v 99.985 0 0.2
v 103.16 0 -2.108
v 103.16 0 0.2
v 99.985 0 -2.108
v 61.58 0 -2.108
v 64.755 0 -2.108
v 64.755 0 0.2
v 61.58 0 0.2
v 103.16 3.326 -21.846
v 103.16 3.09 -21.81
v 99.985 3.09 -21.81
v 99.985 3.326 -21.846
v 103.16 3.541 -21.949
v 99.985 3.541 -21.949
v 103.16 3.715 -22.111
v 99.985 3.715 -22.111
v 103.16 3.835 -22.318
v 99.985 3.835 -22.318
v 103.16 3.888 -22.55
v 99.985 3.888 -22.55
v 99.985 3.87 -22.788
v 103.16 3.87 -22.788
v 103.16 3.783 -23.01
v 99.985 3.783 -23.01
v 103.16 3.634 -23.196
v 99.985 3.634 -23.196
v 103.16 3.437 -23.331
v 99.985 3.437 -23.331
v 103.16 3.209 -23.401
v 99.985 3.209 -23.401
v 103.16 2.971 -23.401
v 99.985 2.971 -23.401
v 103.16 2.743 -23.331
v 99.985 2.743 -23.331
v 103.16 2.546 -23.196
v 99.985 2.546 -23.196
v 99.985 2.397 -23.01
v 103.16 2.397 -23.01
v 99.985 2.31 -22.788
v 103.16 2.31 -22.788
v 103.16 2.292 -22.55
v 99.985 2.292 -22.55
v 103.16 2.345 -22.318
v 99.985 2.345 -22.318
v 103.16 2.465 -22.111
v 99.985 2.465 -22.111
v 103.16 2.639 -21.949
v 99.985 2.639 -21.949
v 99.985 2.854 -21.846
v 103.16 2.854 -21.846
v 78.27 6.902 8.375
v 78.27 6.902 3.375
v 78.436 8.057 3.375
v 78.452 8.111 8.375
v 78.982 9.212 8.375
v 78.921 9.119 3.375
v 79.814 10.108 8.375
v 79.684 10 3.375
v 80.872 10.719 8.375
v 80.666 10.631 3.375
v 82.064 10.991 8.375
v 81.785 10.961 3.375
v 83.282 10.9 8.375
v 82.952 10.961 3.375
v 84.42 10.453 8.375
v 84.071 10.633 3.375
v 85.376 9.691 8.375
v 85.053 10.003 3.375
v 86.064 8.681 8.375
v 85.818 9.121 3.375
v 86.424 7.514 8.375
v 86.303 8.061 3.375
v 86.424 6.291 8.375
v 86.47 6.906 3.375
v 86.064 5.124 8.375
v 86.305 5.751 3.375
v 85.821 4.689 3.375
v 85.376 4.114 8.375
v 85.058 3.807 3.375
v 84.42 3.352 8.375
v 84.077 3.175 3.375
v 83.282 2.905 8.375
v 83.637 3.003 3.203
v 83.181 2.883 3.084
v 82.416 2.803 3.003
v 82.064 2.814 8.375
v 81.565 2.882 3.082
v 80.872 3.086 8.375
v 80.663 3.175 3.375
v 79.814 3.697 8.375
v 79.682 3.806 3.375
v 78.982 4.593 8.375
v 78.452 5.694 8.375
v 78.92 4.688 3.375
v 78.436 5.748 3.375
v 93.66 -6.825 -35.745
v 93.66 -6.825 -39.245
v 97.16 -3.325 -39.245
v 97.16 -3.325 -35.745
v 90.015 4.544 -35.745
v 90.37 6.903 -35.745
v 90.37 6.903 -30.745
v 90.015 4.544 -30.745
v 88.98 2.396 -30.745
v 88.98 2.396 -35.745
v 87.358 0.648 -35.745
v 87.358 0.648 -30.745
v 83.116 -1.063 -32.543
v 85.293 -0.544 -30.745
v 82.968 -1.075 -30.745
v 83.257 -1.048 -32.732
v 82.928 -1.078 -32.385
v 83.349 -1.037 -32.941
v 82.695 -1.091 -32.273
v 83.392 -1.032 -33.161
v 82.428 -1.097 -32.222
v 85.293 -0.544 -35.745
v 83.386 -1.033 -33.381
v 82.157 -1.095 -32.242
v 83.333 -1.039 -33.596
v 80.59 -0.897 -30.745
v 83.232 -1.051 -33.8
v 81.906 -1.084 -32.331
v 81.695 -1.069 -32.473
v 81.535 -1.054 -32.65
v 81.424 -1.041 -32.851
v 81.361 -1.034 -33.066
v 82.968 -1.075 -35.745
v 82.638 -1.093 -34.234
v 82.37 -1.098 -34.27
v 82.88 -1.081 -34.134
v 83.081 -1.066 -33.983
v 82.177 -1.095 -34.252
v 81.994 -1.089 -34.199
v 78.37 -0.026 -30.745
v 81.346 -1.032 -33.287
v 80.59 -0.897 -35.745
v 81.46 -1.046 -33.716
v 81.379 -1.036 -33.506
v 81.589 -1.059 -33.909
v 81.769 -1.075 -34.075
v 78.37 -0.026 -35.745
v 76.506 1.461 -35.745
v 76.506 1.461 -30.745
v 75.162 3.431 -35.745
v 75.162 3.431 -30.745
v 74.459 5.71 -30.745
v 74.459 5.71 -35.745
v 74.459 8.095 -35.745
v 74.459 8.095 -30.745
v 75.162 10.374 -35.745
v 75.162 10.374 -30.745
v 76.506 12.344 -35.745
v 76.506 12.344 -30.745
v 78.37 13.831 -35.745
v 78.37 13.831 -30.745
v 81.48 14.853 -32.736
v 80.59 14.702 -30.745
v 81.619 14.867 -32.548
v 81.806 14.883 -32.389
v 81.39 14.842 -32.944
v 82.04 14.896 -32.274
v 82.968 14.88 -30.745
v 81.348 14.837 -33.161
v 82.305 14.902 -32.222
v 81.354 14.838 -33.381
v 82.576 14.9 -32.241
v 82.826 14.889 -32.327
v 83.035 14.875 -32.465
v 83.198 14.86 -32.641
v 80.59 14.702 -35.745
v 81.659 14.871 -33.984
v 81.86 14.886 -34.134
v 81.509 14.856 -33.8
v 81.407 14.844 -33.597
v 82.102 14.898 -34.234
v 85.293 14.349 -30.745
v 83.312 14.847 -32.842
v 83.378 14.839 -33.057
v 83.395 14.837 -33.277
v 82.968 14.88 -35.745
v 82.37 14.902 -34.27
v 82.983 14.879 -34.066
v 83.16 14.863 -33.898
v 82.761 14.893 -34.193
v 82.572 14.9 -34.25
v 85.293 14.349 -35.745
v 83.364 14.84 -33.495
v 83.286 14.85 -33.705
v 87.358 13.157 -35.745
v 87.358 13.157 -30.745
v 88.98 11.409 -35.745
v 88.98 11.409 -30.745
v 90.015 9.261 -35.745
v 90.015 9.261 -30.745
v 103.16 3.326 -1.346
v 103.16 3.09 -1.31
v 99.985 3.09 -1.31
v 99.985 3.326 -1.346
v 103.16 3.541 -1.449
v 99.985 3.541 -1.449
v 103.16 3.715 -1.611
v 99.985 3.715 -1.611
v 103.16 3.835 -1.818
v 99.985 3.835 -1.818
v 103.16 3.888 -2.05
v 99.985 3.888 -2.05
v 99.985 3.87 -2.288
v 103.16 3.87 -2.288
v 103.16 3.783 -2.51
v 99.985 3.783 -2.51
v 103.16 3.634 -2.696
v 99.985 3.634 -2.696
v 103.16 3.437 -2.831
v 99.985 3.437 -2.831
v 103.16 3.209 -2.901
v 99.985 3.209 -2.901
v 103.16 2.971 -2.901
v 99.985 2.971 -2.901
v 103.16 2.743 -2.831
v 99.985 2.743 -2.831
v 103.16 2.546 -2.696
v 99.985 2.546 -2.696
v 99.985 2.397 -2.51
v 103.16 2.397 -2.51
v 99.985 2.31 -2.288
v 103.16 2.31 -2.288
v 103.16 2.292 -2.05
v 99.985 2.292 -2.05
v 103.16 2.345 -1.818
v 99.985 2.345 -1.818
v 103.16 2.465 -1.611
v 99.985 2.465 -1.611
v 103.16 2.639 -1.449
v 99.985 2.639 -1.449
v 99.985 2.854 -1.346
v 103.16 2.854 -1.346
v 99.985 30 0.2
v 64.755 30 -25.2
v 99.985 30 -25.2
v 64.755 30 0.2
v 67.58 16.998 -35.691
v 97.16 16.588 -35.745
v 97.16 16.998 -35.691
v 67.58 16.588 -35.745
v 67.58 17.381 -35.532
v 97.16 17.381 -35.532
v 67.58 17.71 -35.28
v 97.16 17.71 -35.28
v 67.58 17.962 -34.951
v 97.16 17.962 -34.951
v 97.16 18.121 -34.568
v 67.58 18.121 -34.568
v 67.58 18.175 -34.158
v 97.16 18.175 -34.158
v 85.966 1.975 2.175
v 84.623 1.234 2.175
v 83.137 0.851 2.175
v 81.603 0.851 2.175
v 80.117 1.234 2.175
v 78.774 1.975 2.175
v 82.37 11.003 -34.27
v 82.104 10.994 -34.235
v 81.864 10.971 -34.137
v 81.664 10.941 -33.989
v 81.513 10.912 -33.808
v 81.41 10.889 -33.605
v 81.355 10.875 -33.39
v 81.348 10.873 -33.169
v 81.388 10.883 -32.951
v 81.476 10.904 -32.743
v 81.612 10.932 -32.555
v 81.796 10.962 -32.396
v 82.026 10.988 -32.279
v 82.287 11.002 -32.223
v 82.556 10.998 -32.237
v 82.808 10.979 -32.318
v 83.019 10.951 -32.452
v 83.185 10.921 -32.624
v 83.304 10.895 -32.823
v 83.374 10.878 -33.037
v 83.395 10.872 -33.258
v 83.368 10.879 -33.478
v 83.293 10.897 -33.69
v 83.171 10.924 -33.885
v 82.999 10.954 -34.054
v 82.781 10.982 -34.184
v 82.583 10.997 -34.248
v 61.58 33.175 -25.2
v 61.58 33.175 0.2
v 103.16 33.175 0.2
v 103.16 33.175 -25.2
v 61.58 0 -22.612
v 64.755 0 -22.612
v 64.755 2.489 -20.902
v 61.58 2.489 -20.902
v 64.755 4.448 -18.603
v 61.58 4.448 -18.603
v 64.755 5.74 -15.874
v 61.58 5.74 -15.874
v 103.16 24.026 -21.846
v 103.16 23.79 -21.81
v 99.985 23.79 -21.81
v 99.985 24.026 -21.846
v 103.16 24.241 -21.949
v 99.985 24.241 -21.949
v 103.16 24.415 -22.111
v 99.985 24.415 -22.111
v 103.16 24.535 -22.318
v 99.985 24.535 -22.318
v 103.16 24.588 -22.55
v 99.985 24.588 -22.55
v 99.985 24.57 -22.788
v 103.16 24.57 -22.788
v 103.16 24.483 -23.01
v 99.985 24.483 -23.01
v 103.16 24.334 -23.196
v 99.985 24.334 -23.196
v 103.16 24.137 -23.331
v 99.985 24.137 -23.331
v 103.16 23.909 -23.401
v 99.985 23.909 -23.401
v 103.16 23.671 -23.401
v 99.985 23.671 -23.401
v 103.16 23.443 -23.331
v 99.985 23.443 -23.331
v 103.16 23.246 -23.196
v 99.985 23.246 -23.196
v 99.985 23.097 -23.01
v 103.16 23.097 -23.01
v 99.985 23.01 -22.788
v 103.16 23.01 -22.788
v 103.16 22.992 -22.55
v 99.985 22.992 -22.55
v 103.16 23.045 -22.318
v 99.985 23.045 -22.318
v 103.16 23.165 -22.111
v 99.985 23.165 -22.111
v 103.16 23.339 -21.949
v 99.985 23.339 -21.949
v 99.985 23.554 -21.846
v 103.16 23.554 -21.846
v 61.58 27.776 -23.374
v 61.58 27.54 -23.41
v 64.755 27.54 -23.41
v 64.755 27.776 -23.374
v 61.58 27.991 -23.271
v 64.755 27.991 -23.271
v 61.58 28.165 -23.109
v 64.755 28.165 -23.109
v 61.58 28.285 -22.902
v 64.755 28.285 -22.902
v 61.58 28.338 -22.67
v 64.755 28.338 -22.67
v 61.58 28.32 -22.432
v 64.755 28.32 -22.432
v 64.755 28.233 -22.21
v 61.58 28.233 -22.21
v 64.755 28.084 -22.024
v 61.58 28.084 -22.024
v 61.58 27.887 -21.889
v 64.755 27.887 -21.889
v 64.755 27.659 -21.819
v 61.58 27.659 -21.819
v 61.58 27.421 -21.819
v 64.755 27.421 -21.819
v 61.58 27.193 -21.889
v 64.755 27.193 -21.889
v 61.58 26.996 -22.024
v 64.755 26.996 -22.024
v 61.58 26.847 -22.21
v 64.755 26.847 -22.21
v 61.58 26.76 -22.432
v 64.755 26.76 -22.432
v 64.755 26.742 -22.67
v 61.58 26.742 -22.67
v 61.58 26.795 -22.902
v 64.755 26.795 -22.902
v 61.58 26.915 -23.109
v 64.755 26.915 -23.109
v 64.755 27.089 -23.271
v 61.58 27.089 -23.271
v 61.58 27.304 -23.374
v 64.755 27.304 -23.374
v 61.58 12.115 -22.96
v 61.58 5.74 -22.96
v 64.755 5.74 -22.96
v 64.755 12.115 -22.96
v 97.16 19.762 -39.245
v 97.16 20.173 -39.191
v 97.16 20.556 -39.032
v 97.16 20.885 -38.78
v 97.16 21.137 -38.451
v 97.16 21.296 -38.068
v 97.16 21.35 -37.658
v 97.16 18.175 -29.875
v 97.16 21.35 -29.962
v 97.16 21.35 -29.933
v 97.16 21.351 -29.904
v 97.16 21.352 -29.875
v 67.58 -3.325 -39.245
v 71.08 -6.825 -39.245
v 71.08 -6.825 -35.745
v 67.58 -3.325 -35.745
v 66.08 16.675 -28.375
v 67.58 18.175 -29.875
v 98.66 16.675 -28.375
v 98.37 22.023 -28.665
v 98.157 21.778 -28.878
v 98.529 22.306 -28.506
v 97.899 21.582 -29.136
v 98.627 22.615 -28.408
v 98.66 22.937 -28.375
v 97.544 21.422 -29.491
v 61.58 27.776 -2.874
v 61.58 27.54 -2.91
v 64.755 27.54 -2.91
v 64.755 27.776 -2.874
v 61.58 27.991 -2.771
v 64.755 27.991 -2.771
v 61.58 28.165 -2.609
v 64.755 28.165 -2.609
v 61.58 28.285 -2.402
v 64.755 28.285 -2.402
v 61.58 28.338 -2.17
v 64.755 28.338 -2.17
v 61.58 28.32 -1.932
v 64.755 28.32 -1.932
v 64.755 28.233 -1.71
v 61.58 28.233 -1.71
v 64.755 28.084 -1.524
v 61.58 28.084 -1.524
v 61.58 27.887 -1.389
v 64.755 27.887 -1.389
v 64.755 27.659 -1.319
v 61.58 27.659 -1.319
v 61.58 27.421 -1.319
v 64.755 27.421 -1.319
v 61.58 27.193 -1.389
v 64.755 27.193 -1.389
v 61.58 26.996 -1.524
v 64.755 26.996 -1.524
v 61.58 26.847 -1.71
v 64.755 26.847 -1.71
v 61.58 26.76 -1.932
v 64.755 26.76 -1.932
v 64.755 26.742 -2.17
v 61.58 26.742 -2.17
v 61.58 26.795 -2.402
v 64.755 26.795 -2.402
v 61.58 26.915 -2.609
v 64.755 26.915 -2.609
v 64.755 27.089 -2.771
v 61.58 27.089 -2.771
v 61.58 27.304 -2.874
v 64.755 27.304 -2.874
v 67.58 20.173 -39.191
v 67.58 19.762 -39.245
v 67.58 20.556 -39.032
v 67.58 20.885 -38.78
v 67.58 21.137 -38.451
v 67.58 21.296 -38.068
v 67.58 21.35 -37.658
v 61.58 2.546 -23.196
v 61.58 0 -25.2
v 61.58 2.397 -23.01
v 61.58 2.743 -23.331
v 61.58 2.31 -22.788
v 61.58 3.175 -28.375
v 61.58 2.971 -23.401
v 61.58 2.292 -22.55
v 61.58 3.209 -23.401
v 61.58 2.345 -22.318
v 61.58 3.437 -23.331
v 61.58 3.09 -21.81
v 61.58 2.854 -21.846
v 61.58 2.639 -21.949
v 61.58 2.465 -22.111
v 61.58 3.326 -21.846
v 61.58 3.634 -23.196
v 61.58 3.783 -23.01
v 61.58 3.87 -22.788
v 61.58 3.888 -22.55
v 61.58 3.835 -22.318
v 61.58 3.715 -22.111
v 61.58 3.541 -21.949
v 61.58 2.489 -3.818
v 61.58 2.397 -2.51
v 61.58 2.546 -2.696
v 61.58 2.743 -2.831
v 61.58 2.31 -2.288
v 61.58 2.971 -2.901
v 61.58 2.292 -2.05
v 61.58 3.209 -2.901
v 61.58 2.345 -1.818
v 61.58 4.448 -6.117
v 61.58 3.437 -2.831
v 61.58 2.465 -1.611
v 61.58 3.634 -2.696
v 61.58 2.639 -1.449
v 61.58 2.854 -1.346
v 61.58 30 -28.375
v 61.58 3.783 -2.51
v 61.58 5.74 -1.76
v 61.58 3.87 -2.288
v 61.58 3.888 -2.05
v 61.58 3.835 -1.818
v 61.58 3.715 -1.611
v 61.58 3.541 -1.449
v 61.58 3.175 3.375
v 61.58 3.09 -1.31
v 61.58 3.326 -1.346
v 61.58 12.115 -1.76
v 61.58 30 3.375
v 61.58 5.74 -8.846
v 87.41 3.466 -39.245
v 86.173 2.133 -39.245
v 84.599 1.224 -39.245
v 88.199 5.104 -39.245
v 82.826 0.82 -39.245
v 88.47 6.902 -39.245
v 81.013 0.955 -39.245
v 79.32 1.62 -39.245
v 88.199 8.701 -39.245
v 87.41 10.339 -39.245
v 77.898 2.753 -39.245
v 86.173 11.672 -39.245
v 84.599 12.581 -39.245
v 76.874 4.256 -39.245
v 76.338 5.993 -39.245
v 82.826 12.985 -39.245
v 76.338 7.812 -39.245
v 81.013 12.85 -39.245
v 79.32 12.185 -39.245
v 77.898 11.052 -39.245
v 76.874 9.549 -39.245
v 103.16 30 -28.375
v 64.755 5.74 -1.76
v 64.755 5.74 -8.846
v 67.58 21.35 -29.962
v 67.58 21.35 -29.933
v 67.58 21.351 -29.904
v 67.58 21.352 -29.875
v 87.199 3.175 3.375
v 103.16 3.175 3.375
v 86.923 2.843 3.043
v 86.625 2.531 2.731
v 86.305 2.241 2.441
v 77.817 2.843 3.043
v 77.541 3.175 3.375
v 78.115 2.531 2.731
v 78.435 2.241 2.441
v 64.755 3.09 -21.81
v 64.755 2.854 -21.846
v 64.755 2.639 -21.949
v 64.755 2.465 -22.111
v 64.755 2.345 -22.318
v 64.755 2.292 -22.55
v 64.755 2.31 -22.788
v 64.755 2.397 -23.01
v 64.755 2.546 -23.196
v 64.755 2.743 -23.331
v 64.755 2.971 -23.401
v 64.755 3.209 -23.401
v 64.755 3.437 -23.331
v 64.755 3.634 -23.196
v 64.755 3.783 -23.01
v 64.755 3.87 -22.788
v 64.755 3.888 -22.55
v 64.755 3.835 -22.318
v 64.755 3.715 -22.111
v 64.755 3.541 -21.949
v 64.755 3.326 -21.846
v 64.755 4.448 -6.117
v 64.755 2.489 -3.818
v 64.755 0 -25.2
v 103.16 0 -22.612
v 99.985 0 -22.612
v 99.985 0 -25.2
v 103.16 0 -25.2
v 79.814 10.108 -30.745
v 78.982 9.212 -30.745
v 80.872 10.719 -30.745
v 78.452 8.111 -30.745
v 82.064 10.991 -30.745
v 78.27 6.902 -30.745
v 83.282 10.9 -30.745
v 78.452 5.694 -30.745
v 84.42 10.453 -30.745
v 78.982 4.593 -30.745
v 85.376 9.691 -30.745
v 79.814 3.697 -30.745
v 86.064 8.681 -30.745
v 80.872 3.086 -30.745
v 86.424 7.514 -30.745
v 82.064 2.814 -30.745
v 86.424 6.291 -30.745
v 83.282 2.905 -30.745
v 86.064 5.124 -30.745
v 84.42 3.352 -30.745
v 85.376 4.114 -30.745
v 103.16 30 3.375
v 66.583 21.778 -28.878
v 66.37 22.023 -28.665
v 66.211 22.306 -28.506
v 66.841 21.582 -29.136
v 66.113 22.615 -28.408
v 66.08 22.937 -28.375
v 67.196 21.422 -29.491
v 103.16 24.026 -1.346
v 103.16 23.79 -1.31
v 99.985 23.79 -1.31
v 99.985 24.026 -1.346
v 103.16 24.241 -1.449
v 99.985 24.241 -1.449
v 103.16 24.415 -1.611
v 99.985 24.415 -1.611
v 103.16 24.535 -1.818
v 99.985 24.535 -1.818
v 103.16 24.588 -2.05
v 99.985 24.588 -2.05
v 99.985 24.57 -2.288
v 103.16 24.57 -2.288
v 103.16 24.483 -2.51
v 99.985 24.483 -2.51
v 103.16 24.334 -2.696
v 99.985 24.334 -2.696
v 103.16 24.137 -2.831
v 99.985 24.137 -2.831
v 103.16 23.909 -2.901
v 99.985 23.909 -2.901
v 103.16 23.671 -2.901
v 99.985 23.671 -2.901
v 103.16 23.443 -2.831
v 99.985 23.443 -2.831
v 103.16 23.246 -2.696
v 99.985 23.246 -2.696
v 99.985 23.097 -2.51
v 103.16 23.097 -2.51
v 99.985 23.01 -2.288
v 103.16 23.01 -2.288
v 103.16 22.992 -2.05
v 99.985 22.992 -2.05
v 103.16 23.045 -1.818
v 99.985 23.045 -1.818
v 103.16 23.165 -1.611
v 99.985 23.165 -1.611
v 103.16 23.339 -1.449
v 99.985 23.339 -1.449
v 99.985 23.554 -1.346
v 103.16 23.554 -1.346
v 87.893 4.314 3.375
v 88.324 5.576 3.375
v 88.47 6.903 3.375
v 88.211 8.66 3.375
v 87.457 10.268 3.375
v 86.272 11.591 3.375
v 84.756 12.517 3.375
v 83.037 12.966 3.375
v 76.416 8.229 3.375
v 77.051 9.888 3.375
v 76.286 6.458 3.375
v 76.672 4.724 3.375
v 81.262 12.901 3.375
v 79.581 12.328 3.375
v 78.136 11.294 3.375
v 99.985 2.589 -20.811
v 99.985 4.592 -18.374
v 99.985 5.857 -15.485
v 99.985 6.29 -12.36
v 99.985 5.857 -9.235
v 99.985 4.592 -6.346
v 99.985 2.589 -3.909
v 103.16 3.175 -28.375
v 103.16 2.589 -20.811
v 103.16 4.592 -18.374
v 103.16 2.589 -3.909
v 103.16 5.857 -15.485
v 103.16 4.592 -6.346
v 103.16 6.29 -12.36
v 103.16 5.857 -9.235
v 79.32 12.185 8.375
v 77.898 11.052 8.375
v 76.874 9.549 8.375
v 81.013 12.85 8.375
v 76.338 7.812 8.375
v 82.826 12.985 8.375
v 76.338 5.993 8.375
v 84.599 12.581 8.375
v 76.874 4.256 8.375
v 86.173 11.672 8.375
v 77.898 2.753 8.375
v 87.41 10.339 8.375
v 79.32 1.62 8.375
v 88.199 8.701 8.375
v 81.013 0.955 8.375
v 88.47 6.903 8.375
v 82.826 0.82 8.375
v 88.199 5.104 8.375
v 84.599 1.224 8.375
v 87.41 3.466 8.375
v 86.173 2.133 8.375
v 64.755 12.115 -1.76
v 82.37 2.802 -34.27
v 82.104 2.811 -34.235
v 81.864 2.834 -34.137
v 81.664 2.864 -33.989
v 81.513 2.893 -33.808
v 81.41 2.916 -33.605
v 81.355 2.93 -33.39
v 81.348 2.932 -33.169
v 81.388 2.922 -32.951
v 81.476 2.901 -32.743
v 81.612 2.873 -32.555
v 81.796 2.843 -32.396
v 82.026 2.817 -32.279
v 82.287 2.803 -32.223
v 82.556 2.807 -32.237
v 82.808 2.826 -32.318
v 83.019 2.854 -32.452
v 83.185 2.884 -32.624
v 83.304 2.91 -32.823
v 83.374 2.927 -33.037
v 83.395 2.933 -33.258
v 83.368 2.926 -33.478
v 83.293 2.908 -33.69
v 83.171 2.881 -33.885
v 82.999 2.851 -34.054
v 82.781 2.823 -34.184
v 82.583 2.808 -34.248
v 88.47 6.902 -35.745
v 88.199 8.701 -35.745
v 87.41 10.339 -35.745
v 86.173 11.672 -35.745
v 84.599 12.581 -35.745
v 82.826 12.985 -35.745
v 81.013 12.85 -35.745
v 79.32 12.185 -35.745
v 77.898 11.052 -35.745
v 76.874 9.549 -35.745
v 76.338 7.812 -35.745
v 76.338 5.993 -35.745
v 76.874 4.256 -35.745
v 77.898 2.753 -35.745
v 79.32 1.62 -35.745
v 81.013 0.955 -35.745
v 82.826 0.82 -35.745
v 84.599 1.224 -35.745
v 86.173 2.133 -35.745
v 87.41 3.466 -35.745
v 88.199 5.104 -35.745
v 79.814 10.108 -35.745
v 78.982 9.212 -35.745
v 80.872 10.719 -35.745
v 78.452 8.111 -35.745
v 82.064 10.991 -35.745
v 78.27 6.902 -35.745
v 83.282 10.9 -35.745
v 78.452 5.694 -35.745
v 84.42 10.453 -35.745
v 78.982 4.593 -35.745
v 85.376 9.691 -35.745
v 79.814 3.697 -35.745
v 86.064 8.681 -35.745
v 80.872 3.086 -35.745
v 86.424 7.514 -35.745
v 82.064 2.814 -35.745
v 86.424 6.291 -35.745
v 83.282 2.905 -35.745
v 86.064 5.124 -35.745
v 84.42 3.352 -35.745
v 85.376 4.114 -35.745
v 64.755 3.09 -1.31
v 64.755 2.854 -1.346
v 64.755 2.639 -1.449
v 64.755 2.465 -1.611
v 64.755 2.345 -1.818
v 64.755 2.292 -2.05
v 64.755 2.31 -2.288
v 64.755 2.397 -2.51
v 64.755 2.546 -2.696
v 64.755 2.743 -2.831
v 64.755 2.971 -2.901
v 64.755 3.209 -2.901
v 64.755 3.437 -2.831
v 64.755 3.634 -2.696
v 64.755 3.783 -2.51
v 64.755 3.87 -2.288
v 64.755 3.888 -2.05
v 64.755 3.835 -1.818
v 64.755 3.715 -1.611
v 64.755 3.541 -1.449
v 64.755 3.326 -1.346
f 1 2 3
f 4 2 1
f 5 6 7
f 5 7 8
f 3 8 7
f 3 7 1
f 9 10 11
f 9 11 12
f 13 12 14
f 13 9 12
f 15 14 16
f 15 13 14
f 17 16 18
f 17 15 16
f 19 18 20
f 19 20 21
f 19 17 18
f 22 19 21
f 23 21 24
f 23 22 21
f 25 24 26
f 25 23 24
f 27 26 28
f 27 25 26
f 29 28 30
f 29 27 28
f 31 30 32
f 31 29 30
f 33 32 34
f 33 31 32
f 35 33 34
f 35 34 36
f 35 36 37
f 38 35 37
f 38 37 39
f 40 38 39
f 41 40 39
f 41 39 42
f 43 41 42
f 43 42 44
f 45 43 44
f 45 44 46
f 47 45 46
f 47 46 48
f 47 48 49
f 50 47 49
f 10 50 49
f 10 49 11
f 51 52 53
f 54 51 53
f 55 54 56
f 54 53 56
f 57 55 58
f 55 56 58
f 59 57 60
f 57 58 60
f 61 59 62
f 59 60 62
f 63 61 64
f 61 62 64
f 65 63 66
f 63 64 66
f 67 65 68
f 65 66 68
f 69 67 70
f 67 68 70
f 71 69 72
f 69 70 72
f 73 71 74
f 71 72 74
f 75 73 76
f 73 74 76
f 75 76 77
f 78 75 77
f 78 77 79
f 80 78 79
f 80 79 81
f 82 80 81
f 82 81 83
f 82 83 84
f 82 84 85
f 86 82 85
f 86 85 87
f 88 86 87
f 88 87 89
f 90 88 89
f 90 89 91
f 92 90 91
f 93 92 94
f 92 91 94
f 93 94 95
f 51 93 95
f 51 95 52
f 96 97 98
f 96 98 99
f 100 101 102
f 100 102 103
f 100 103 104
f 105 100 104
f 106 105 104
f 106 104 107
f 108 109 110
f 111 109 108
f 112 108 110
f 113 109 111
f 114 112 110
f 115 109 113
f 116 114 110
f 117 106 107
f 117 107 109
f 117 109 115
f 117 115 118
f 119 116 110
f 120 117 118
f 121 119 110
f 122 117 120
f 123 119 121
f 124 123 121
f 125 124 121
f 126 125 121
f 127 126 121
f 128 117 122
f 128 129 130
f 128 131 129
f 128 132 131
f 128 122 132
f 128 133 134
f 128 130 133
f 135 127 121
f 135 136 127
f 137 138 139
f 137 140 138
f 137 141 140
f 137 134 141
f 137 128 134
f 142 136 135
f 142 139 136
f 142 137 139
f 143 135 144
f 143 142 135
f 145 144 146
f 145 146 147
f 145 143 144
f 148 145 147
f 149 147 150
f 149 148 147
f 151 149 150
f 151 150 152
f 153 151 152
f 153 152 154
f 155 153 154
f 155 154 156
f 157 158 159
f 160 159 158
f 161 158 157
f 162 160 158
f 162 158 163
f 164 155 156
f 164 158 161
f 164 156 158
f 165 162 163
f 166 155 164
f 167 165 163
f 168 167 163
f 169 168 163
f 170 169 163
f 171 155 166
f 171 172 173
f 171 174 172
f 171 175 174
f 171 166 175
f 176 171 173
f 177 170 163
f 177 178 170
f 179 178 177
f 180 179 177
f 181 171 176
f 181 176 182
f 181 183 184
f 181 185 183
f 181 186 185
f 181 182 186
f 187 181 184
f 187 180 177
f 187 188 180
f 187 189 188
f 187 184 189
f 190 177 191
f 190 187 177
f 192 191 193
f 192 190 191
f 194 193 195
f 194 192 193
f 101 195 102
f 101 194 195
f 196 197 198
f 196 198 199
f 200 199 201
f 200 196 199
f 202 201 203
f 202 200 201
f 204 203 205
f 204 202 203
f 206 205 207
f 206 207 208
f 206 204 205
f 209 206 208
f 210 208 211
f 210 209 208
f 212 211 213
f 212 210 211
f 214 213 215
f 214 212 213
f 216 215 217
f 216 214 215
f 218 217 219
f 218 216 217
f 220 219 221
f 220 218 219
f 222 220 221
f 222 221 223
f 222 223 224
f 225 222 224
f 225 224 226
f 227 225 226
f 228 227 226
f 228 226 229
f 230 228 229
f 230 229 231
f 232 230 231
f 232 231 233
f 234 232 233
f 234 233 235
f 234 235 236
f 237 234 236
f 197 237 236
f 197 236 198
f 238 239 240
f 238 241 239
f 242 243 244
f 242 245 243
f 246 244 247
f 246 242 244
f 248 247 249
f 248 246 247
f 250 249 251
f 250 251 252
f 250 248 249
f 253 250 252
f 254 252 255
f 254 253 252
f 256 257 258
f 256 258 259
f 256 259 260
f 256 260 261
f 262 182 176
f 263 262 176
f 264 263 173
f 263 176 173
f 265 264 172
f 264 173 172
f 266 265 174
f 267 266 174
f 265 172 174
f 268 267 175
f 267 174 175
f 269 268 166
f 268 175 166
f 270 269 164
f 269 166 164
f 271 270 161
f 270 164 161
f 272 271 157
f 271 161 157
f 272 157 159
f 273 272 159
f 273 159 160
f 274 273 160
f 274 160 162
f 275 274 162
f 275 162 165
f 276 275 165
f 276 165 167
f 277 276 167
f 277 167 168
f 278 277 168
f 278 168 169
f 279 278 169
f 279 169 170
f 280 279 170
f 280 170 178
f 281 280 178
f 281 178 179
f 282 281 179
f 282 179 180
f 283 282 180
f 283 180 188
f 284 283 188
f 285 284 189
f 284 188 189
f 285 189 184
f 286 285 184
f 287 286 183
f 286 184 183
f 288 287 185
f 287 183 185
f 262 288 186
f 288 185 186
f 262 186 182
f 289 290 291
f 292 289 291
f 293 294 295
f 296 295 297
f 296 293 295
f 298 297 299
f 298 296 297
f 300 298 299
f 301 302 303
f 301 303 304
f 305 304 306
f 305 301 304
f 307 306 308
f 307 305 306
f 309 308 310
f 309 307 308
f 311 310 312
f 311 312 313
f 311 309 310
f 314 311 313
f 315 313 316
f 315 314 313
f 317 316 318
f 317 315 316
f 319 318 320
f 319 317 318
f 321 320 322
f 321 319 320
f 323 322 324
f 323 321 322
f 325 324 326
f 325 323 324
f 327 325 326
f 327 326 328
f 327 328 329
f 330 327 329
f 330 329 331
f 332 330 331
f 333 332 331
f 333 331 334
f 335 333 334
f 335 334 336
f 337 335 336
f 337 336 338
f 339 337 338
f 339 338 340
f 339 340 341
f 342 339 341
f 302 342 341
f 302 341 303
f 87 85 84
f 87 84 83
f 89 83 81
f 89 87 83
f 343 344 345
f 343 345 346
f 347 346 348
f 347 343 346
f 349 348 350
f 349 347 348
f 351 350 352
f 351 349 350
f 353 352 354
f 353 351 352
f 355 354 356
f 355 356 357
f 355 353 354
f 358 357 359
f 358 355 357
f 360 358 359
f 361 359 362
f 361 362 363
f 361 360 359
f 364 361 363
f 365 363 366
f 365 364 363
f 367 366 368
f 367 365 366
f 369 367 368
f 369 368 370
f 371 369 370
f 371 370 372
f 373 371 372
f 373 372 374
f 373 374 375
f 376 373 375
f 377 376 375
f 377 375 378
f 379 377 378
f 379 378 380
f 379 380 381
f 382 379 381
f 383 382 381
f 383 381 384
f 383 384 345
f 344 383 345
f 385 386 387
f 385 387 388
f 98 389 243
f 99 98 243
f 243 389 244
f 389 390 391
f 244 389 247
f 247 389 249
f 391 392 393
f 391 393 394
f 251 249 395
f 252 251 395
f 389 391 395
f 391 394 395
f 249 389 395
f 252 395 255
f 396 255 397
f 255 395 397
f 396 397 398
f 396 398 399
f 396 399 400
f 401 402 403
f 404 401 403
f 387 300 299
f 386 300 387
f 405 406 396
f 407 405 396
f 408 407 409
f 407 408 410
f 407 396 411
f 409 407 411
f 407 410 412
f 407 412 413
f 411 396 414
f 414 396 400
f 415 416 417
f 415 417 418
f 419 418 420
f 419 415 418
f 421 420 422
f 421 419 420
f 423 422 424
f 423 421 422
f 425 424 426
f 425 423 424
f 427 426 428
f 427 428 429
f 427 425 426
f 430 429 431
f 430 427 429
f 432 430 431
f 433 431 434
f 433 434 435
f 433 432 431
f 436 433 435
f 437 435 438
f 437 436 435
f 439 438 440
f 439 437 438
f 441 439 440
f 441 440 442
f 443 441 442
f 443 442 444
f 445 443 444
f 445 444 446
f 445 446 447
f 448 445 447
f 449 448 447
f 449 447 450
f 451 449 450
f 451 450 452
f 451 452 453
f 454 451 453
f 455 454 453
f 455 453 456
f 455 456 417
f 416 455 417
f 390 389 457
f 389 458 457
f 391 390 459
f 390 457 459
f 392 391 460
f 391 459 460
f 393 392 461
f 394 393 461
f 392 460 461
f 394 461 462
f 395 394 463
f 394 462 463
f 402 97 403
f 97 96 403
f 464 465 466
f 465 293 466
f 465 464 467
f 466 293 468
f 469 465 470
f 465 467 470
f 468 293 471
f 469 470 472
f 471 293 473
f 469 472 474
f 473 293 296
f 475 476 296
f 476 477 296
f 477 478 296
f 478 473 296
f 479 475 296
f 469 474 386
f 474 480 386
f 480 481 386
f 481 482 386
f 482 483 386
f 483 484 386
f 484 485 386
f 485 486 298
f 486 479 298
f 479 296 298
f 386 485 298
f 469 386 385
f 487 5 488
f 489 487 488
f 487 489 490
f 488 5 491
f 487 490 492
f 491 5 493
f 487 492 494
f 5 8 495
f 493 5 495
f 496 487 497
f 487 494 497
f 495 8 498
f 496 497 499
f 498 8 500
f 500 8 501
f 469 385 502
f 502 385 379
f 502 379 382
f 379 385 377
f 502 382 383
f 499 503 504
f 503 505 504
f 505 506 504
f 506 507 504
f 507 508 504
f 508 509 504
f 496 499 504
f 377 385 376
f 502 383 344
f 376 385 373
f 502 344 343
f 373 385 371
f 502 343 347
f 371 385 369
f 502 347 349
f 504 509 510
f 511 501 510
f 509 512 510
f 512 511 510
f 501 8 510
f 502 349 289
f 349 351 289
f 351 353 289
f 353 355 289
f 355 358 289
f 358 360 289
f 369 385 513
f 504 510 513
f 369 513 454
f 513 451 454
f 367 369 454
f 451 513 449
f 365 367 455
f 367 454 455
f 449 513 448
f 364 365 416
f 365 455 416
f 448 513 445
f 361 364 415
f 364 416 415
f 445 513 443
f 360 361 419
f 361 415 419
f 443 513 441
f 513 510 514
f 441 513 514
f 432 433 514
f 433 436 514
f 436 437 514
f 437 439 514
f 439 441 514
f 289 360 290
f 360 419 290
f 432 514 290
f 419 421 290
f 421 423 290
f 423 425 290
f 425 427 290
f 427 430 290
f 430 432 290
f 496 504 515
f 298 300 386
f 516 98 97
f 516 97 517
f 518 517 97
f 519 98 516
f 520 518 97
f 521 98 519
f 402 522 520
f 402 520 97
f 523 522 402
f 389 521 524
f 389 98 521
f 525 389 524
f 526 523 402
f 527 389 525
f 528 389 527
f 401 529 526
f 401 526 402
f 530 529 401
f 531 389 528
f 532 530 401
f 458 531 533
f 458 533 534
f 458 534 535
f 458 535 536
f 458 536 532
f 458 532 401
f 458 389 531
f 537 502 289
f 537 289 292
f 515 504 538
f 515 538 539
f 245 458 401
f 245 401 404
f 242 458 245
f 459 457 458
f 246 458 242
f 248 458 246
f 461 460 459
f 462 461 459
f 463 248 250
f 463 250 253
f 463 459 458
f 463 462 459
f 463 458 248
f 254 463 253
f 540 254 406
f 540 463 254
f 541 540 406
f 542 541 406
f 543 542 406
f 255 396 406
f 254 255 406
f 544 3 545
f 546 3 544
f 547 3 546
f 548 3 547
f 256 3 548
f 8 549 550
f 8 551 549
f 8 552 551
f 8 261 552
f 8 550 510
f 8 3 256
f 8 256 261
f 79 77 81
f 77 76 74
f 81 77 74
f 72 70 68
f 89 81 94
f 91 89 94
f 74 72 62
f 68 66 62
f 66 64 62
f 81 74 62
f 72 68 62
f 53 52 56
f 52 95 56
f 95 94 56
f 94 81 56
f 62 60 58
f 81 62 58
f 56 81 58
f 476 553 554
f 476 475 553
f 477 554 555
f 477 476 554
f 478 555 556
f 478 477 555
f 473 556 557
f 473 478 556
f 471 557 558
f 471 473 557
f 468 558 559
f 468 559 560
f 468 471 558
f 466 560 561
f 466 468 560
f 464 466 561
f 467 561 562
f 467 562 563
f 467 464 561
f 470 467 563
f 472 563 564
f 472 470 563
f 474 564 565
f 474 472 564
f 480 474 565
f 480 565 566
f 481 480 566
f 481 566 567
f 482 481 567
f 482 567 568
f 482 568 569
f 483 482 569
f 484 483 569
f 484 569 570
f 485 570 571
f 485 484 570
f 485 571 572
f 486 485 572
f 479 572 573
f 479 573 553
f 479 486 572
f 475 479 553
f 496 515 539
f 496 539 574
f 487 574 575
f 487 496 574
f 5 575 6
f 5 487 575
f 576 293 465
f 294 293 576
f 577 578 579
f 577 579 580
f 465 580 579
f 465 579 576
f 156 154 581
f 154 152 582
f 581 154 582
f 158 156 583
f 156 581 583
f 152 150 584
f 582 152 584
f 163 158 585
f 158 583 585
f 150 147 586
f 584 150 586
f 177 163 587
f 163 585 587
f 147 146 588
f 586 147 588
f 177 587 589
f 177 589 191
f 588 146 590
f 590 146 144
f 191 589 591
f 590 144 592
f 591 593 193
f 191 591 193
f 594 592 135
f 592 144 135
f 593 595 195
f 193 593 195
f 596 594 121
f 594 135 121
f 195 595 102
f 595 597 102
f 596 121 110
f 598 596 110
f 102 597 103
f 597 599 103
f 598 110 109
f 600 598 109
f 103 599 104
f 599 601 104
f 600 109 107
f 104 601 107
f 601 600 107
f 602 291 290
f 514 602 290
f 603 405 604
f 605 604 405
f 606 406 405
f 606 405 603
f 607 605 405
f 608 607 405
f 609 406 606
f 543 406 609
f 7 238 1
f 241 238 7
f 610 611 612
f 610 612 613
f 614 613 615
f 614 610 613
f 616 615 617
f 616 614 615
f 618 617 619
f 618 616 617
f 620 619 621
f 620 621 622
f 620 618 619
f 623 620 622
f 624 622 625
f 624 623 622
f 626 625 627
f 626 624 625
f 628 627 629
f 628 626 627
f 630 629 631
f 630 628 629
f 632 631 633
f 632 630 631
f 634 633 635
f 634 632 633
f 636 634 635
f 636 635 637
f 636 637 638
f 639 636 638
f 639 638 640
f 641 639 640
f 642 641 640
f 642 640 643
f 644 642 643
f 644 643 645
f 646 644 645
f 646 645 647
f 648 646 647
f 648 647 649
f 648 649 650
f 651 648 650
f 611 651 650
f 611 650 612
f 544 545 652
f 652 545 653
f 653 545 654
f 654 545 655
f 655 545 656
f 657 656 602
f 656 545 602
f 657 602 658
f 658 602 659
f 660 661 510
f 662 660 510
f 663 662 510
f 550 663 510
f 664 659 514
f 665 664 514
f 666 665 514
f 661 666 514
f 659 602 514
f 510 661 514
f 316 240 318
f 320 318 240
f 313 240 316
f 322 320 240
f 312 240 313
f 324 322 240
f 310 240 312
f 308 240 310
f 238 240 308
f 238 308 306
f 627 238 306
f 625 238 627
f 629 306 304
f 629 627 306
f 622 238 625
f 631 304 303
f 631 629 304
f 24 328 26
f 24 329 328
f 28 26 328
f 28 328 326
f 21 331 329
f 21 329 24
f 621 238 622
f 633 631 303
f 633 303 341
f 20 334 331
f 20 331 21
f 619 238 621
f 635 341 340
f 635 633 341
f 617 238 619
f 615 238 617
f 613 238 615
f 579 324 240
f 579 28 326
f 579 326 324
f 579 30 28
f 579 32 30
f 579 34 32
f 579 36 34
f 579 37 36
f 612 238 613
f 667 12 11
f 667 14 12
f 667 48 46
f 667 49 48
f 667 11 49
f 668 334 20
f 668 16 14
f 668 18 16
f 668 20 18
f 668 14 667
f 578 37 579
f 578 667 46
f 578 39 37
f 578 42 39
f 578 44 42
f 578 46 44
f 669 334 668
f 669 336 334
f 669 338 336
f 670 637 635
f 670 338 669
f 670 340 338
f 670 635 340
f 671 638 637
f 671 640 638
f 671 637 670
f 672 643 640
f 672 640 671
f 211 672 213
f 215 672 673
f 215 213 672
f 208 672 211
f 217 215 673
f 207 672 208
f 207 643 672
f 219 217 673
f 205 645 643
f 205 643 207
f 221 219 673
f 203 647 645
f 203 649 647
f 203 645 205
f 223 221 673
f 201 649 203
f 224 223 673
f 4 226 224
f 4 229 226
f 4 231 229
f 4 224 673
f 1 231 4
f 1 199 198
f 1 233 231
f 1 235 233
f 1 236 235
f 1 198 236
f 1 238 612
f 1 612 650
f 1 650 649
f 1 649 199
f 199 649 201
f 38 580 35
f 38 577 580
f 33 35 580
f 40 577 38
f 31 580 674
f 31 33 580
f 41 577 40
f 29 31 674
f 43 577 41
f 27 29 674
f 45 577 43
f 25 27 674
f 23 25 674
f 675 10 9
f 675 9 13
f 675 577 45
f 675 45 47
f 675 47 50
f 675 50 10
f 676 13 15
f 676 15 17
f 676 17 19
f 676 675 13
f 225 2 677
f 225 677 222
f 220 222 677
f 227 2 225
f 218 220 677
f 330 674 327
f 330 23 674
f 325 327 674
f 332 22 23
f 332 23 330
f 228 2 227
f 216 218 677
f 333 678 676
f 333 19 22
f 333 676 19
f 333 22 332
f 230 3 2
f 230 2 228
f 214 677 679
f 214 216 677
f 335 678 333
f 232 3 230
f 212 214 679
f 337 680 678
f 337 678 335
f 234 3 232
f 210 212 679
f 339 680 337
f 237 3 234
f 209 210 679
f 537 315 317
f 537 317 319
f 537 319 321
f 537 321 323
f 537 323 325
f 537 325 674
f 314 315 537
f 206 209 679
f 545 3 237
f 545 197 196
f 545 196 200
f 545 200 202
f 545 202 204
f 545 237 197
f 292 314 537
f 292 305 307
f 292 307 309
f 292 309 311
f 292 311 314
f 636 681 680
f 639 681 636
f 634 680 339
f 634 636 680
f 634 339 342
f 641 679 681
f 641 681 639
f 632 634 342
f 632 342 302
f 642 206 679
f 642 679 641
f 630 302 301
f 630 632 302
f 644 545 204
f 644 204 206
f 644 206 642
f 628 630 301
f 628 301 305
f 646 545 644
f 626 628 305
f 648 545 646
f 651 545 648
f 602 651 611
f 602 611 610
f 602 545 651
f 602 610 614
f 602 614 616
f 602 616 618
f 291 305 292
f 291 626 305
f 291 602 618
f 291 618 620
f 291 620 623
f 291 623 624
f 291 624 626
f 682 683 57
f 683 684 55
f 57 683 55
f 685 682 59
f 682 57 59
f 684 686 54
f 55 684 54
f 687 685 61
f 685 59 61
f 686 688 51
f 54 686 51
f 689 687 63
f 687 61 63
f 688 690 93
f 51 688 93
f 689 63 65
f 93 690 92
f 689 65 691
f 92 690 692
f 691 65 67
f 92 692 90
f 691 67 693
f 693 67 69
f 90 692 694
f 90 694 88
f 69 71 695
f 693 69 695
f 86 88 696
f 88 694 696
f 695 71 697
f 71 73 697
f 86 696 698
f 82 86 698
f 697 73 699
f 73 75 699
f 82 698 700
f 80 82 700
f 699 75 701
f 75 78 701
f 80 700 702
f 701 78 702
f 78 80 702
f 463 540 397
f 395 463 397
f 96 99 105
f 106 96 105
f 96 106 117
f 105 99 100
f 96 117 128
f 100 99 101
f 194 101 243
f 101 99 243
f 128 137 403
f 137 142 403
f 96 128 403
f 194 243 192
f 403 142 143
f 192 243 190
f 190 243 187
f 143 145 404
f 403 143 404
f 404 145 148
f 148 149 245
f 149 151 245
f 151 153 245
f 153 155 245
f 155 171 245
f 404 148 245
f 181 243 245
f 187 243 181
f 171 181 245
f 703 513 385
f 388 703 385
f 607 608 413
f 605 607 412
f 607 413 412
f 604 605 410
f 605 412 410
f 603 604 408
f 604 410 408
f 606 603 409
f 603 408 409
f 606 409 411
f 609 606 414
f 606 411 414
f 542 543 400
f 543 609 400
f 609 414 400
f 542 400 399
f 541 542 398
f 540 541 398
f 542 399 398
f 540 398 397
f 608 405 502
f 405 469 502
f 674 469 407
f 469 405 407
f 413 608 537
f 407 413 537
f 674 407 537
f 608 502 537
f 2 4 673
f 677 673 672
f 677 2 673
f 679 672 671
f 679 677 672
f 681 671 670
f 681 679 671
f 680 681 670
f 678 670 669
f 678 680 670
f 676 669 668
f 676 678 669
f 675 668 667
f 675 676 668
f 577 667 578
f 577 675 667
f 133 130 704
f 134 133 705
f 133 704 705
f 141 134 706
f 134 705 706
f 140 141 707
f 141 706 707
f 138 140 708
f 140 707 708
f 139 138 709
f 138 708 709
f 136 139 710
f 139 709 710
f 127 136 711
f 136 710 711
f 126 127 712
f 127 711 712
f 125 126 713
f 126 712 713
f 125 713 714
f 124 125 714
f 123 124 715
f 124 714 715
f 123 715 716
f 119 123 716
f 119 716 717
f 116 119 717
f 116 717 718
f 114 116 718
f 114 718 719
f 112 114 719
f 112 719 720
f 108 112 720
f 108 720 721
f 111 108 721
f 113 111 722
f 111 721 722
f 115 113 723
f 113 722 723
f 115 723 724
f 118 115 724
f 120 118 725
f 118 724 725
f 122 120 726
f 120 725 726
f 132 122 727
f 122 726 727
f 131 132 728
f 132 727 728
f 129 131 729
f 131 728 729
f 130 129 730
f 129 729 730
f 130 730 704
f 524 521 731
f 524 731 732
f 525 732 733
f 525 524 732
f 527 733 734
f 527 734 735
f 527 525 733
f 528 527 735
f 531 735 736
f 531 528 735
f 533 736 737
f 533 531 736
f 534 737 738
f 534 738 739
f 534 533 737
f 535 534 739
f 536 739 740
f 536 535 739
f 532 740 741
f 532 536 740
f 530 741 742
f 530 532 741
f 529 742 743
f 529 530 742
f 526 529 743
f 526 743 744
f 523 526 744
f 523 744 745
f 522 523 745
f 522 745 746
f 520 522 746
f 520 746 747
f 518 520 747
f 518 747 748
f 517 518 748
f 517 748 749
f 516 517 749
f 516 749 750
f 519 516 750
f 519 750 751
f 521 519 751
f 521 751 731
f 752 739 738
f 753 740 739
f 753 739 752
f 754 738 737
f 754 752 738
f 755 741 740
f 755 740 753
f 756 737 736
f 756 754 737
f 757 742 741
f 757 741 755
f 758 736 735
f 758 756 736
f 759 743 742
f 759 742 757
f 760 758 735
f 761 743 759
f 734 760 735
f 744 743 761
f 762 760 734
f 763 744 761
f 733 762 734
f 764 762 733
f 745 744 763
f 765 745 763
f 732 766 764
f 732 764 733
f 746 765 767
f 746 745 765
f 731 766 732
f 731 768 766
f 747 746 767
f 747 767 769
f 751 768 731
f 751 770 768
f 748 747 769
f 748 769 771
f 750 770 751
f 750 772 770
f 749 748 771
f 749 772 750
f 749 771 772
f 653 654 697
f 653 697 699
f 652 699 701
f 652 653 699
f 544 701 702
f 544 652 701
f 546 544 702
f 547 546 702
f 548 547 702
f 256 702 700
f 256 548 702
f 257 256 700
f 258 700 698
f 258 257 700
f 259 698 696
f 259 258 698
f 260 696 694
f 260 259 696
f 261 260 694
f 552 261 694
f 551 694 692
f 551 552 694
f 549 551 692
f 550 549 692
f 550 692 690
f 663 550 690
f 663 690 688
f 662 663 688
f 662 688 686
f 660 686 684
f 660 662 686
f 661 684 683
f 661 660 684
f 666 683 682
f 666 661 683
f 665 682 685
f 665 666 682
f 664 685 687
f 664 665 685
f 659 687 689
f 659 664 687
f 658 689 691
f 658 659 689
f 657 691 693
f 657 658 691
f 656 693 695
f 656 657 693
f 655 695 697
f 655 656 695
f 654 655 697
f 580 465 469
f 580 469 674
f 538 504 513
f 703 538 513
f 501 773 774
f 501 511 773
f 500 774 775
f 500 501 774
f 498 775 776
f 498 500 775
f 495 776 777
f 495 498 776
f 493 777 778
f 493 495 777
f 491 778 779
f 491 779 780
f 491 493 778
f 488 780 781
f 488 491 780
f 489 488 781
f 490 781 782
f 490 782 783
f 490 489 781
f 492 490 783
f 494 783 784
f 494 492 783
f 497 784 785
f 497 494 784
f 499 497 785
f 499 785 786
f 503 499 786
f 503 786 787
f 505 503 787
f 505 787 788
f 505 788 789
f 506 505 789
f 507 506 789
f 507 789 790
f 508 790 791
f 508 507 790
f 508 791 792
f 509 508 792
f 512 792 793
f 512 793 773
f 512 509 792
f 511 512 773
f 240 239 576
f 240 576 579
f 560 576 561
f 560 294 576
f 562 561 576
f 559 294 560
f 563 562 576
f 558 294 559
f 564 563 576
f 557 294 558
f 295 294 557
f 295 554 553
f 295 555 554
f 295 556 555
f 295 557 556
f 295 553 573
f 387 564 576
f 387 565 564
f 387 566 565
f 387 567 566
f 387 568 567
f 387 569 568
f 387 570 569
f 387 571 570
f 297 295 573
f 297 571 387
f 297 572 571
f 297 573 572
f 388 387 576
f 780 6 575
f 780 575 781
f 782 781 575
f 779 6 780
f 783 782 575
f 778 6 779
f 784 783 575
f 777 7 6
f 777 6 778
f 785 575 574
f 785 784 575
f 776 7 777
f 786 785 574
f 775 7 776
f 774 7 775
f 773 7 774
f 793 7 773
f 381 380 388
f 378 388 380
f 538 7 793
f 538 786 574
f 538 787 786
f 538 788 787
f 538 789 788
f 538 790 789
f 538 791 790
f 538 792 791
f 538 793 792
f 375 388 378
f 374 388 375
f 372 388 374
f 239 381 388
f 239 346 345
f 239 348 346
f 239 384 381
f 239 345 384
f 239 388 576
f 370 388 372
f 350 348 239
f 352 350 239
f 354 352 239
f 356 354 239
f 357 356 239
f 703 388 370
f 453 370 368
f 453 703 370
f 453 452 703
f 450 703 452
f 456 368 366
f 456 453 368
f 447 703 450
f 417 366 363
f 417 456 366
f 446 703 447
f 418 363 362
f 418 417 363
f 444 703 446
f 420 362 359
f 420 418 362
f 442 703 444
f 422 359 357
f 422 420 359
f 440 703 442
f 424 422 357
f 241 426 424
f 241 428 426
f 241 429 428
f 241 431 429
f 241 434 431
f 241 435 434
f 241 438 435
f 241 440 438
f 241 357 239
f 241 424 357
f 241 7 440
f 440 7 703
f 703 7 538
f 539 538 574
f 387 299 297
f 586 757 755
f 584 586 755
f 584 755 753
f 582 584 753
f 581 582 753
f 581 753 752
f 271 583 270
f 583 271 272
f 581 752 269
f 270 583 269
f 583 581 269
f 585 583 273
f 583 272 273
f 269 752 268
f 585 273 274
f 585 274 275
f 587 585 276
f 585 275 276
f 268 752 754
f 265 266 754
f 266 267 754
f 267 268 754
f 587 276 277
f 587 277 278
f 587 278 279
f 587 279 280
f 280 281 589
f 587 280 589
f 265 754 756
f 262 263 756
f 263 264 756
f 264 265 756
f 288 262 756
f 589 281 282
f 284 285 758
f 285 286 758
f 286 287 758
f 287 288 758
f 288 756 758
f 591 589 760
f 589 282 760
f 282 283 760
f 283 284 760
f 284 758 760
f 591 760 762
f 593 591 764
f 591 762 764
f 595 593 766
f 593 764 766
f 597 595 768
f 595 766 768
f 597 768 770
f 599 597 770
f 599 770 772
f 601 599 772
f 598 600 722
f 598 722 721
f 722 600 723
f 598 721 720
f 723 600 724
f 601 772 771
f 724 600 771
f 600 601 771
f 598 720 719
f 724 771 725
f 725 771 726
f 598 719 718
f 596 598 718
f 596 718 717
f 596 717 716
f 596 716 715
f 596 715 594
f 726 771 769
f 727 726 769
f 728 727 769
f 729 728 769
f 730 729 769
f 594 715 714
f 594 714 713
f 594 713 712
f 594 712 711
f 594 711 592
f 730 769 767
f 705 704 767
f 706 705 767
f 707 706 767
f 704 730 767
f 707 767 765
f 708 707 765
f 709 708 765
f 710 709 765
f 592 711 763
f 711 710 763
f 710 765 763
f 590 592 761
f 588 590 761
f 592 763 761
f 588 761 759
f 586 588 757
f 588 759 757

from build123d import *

# Parameters (mm, degrees)
SKETCH1_W                       = 25
SKETCH1_H                       = 30
BOSS_EXTRUDE1_DEPTH             = 3.175
SKETCH2_W                       = 25
SKETCH2_H                       = 3.175
BOSS_EXTRUDE2_DEPTH             = 41.58
SKETCH3_W                       = 3.175
SKETCH3_H                       = 25
BOSS_EXTRUDE3_DEPTH             = 30
CUT_EXTRUDE1_REACH              = 60.775
SKETCH4_R                       = 11.5
CUT_EXTRUDE2_REACH              = 60.775
SKETCH5_R                       = 0.8
CUT_EXTRUDE3_REACH              = 60.775
SKETCH6_R                       = 0.8
SKETCH6_R_2                     = 0.799851166
SKETCH6_W                       = 21.2
SKETCH6_H                       = 6.375
CUT_EXTRUDE4_REACH              = 60.775
SKETCH7_R                       = 11.5
BOSS_EXTRUDE4_DEPTH             = 0.2
SKETCH9_W                       = 41.58
SKETCH9_H                       = 33.175
BOSS_EXTRUDE5_DEPTH             = 3.175
BOSS_EXTRUDE6_DEPTH             = 0.2
SKETCH11_W                      = 41.58
SKETCH11_H                      = 33.175
BOSS_EXTRUDE7_DEPTH             = 3.175
CHAMFER1_SIZE                   = 3.175
CHAMFER2_SIZE                   = 3.175
SKETCH13_W                      = 29.58
SKETCH13_H                      = 3.175
BOSS_EXTRUDE8_DEPTH             = 7.695
BOSS_EXTRUDE9_REACH             = 59.968
SKETCH14_W                      = 29.58
SKETCH14_H                      = 3.5
BOSS_EXTRUDE9_DIRECTION_2_DEPTH = 25
CHAMFER3_SIZE                   = 3.5
FILLET1_R                       = 1.5875
FILLET2_R                       = 1.5875
CUT_EXTRUDE5_REACH              = 70.161
SKETCH16_R                      = 6.1
SKETCH20_R                      = 8
SKETCH20_R_2                    = 4.1
BOSS_EXTRUDE11_DEPTH            = 5
CUT_EXTRUDE6_START              = -21.7275
SKETCH21_R                      = 1.025
CUT_EXTRUDE6_DEPTH              = 16
BOSS_EXTRUDE12_DEPTH            = 5
BOSS_EXTRUDE12_DEPTH_BACK       = 1.2
SKETCH23_R                      = 6.1
SKETCH23_R_2                    = 4.1
CHAMFER4_SIZE                   = 1.5


with BuildPart() as part:
    # Sketch1 → Boss-Extrude1 (new body)
    with BuildSketch(Plane(origin=(0, 0, 0), x_dir=(0, 0, -1), z_dir=(1, 0, 0))):
        with Locations((12.5, 15)):
            Rectangle(SKETCH1_W, SKETCH1_H)
    extrude(amount=BOSS_EXTRUDE1_DEPTH)

    # Sketch2 → Boss-Extrude2 (add)
    with BuildSketch(Plane.ZY):
        with Locations((-12.5, 31.5875)):
            Rectangle(SKETCH2_W, SKETCH2_H)
    extrude(amount=-BOSS_EXTRUDE2_DEPTH)

    # Sketch3 → Boss-Extrude3 (add)
    with BuildSketch(Plane.XZ.offset(-30)):
        with Locations((39.9925, -12.5)):
            Rectangle(SKETCH3_W, SKETCH3_H)
    extrude(amount=BOSS_EXTRUDE3_DEPTH)

    # Sketch4 → Cut-Extrude1 (cut, up to next)
    with BuildSketch(Plane.ZY, mode=Mode.PRIVATE) as cut_extrude1_sk1:
        with Locations((-12.359999929, -5.209996254)):
            Circle(SKETCH4_R)
    cut_extrude1_tool1 = extrude(cut_extrude1_sk1.sketch, amount=-CUT_EXTRUDE1_REACH, mode=Mode.PRIVATE) & part.part
    add(cut_extrude1_tool1.solids().sort_by_distance((0, -5.209996, -12.36))[0], mode=Mode.SUBTRACT)

    # Sketch5 → Cut-Extrude2 (cut, up to next)
    with BuildSketch(Plane.ZY, mode=Mode.PRIVATE) as cut_extrude2_sk1:
        with Locations((-22.609999929, 3.090003746)):
            Circle(SKETCH5_R)
    cut_extrude2_tool1 = extrude(cut_extrude2_sk1.sketch, amount=-CUT_EXTRUDE2_REACH, mode=Mode.PRIVATE) & part.part
    # Sketch5 → Cut-Extrude2 (cut, up to next)
    with BuildSketch(Plane.ZY, mode=Mode.PRIVATE) as cut_extrude2_sk2:
        with Locations((-22.609999929, 23.790003746)):
            Circle(SKETCH5_R)
    cut_extrude2_tool2 = extrude(cut_extrude2_sk2.sketch, amount=-CUT_EXTRUDE2_REACH, mode=Mode.PRIVATE) & part.part
    # Sketch5 → Cut-Extrude2 (cut, up to next)
    with BuildSketch(Plane.ZY, mode=Mode.PRIVATE) as cut_extrude2_sk3:
        with Locations((-2.109999929, 23.790003746)):
            Circle(SKETCH5_R)
    cut_extrude2_tool3 = extrude(cut_extrude2_sk3.sketch, amount=-CUT_EXTRUDE2_REACH, mode=Mode.PRIVATE) & part.part
    # Sketch5 → Cut-Extrude2 (cut, up to next)
    with BuildSketch(Plane.ZY, mode=Mode.PRIVATE) as cut_extrude2_sk4:
        with Locations((-2.109999929, 3.090003746)):
            Circle(SKETCH5_R)
    cut_extrude2_tool4 = extrude(cut_extrude2_sk4.sketch, amount=-CUT_EXTRUDE2_REACH, mode=Mode.PRIVATE) & part.part
    add(cut_extrude2_tool1.solids().sort_by_distance((0, 3.090004, -22.61))[0], mode=Mode.SUBTRACT)
    add(cut_extrude2_tool2.solids().sort_by_distance((0, 23.790004, -22.61))[0], mode=Mode.SUBTRACT)
    add(cut_extrude2_tool3.solids().sort_by_distance((0, 23.790004, -2.11))[0], mode=Mode.SUBTRACT)
    add(cut_extrude2_tool4.solids().sort_by_distance((0, 3.090004, -2.11))[0], mode=Mode.SUBTRACT)

    # Sketch6 → Cut-Extrude3 (cut, up to next)
    with BuildSketch(Plane(origin=(41.58, 0, 0), x_dir=(0, 0, -1), z_dir=(1, 0, 0)), mode=Mode.PRIVATE) as cut_extrude3_sk1:
        with Locations(Location((2.109999929, 3.090003746, 0), (0, 0, 180))):
            Circle(SKETCH6_R)
    cut_extrude3_tool1 = extrude(cut_extrude3_sk1.sketch, amount=-CUT_EXTRUDE3_REACH, mode=Mode.PRIVATE) & part.part
    # Sketch6 → Cut-Extrude3 (cut, up to next)
    with BuildSketch(Plane(origin=(41.58, 0, 0), x_dir=(0, 0, -1), z_dir=(1, 0, 0)), mode=Mode.PRIVATE) as cut_extrude3_sk2:
        with Locations(Location((22.609999929, 3.090003746, 0), (0, 0, 180))):
            Circle(SKETCH6_R)
    cut_extrude3_tool2 = extrude(cut_extrude3_sk2.sketch, amount=-CUT_EXTRUDE3_REACH, mode=Mode.PRIVATE) & part.part
    # Sketch6 → Cut-Extrude3 (cut, up to next)
    with BuildSketch(Plane(origin=(41.58, 0, 0), x_dir=(0, 0, -1), z_dir=(1, 0, 0)), mode=Mode.PRIVATE) as cut_extrude3_sk3:
        with Locations((22.609999929, 27.540003746)):
            Circle(SKETCH6_R_2)
    cut_extrude3_tool3 = extrude(cut_extrude3_sk3.sketch, amount=-CUT_EXTRUDE3_REACH, mode=Mode.PRIVATE) & part.part
    # Sketch6 → Cut-Extrude3 (cut, up to next)
    with BuildSketch(Plane(origin=(41.58, 0, 0), x_dir=(0, 0, -1), z_dir=(1, 0, 0)), mode=Mode.PRIVATE) as cut_extrude3_sk4:
        with Locations((2.109999929, 27.540003746)):
            Circle(SKETCH6_R)
    cut_extrude3_tool4 = extrude(cut_extrude3_sk4.sketch, amount=-CUT_EXTRUDE3_REACH, mode=Mode.PRIVATE) & part.part
    # Sketch6 → Cut-Extrude3 (cut, up to next)
    with BuildSketch(Plane(origin=(41.58, 0, 0), x_dir=(0, 0, -1), z_dir=(1, 0, 0)), mode=Mode.PRIVATE) as cut_extrude3_sk5:
        with Locations((12.359999929, 8.927503746)):
            Rectangle(SKETCH6_W, SKETCH6_H)
    cut_extrude3_tool5 = extrude(cut_extrude3_sk5.sketch, amount=-CUT_EXTRUDE3_REACH, mode=Mode.PRIVATE) & part.part
    add(cut_extrude3_tool1.solids().sort_by_distance((41.58, 3.090004, -2.11))[0], mode=Mode.SUBTRACT)
    add(cut_extrude3_tool2.solids().sort_by_distance((41.58, 3.090004, -22.61))[0], mode=Mode.SUBTRACT)
    add(cut_extrude3_tool3.solids().sort_by_distance((41.58, 27.540004, -22.61))[0], mode=Mode.SUBTRACT)
    add(cut_extrude3_tool4.solids().sort_by_distance((41.58, 27.540004, -2.11))[0], mode=Mode.SUBTRACT)
    add(cut_extrude3_tool5.solids().sort_by_distance((41.58, 8.927504, -12.36))[0], mode=Mode.SUBTRACT)

    # Sketch7 → Cut-Extrude4 (cut, up to next)
    with BuildSketch(Plane(origin=(41.58, 0, 0), x_dir=(0, 0, -1), z_dir=(1, 0, 0)), mode=Mode.PRIVATE) as cut_extrude4_sk1:
        with Locations((12.359999929, -5.209996254)):
            Circle(SKETCH7_R)
    cut_extrude4_tool1 = extrude(cut_extrude4_sk1.sketch, amount=-CUT_EXTRUDE4_REACH, mode=Mode.PRIVATE) & part.part
    add(cut_extrude4_tool1.solids().sort_by_distance((41.58, -5.209996, -12.36))[0], mode=Mode.SUBTRACT)

    # Sketch8 → Boss-Extrude4 (add)
    with BuildSketch(Plane.XY):
        Polygon((0, 33.175), (0, 0), (3.175, 0), (3.175, 30), (38.405, 30), (38.405, 0), (41.58, 0), (41.58, 33.175), align=None)
    extrude(amount=BOSS_EXTRUDE4_DEPTH)

    # Sketch9 → Boss-Extrude5 (add)
    with BuildSketch(Plane.XY.offset(0.2)):
        with Locations((20.79, 16.5875)):
            Rectangle(SKETCH9_W, SKETCH9_H)
    extrude(amount=BOSS_EXTRUDE5_DEPTH)

    # Sketch10 → Boss-Extrude6 (add)
    with BuildSketch(Plane(origin=(0, 0, -25), x_dir=(-1, 0, 0), z_dir=(0, 0, -1))):
        Polygon((0, 0), (0, 33.175), (-41.58, 33.175), (-41.58, 0), (-38.405, 0), (-38.405, 30), (-3.175, 30), (-3.175, 0), align=None)
    extrude(amount=BOSS_EXTRUDE6_DEPTH)

    # Sketch11 → Boss-Extrude7 (add)
    with BuildSketch(Plane(origin=(0, 0, -25.2), x_dir=(-1, 0, 0), z_dir=(0, 0, -1))):
        with Locations((-20.79, 16.5875)):
            Rectangle(SKETCH11_W, SKETCH11_H)
    extrude(amount=BOSS_EXTRUDE7_DEPTH)

    # Chamfer1
    chamfer1_edges = [part.edges().sort_by_distance(p)[0] for p in [
        (20.79, 33.175, 3.375),
        (20.79, 33.175, -28.375),
    ]]
    chamfer(chamfer1_edges, length=CHAMFER1_SIZE)

    # Chamfer2
    chamfer2_edges = [part.edges().sort_by_distance(p)[0] for p in [
        (20.79, 0, 3.375),
        (20.79, 0, -28.375),
    ]]
    chamfer(chamfer2_edges, length=CHAMFER2_SIZE - 0.0001)  # a hair under: the kernel refuses the full size

    # Sketch13 → Boss-Extrude8 (add)
    with BuildSketch(Plane(origin=(0, 0, -28.375), x_dir=(-1, 0, 0), z_dir=(0, 0, -1))):
        with Locations((-20.79, 19.7625)):
            Rectangle(SKETCH13_W, SKETCH13_H)
    extrude(amount=BOSS_EXTRUDE8_DEPTH)

    # Boss-Extrude9: up to this face of the body (flat: up to its plane)
    boss_extrude9_end = Plane(part.part.faces().sort_by_distance((20.79, 21.35, -32.2225))[0])
    # Sketch14 → Boss-Extrude9 (add, up to the picked face)
    with BuildSketch(Plane.XZ.offset(-18.175), mode=Mode.PRIVATE) as boss_extrude9_sk1:
        with Locations((20.79, -37.495)):
            Rectangle(SKETCH14_W, SKETCH14_H)
    boss_extrude9_tool1 = split(extrude(boss_extrude9_sk1.sketch, amount=-BOSS_EXTRUDE9_REACH, mode=Mode.PRIVATE), bisect_by=boss_extrude9_end, keep=Keep.BOTH, mode=Mode.PRIVATE)
    add(boss_extrude9_tool1.solids().sort_by(Axis((20.79, 18.175, -37.495), (0, 1, 0)))[0])

    # Sketch14 → Boss-Extrude9 direction 2 (add)
    with BuildSketch(Plane.XZ.offset(-18.175)):
        with Locations((20.79, -37.495)):
            Rectangle(SKETCH14_W, SKETCH14_H)
    extrude(amount=BOSS_EXTRUDE9_DIRECTION_2_DEPTH)

    # Chamfer3
    chamfer3_edges = [part.edges().sort_by_distance(p)[0] for p in [
        (6, -6.825, -37.495),
        (35.58, -6.825, -37.495),
    ]]
    chamfer(chamfer3_edges, length=CHAMFER3_SIZE)

    # Fillet1
    fillet1_edges = [part.edges().sort_by_distance(p)[0] for p in [
        (20.79, 18.175, -35.745),
        (20.79, 21.35, -39.245),
    ]]
    fillet(fillet1_edges, radius=FILLET1_R)

    # Fillet2
    fillet2_edges = [part.edges().sort_by_distance(p)[0] for p in [
        (20.79, 21.35, -28.375),
    ]]
    fillet(fillet2_edges, radius=FILLET2_R)

    # Sketch16 → Cut-Extrude5 (cut, up to next)
    with BuildSketch(Plane(origin=(0, 0, -39.245), x_dir=(-1, 0, 0), z_dir=(0, 0, -1)), mode=Mode.PRIVATE) as cut_extrude5_sk1:
        with Locations((-20.79, 6.9025)):
            Circle(SKETCH16_R)
    cut_extrude5_tool1 = extrude(cut_extrude5_sk1.sketch, amount=-CUT_EXTRUDE5_REACH, mode=Mode.PRIVATE) & part.part
    add(cut_extrude5_tool1.solids().sort_by_distance((20.79, 6.9025, -39.245))[0], mode=Mode.SUBTRACT)

    # Sketch20 → Boss-Extrude11 (add)
    with BuildSketch(Plane.XY.offset(-35.745)):
        with Locations(Location((20.79, 6.9025, 0), (0, 0, 180))):
            Circle(SKETCH20_R)
        with Locations((20.79, 6.9025)):
            Circle(SKETCH20_R_2, mode=Mode.SUBTRACT)
    extrude(amount=BOSS_EXTRUDE11_DEPTH)

    # Sketch21 → Cut-Extrude6 (cut)
    with BuildSketch(Plane.XZ.offset(6.825).offset(CUT_EXTRUDE6_START)):
        with Locations(Location((20.79, -33.245, 0), (0, 0, 270))):
            Circle(SKETCH21_R)
    extrude(amount=CUT_EXTRUDE6_DEPTH, mode=Mode.SUBTRACT)

    # Sketch23 → Boss-Extrude12 (add, two sides: drawn at the far end of the back side and taken through both)
    with BuildSketch(Plane.XY.offset(3.375).offset(-BOSS_EXTRUDE12_DEPTH_BACK)):
        with Locations(Location((20.79, 6.9025, 0), (0, 0, 180))):
            Circle(SKETCH23_R)
        with Locations((20.79, 6.9025)):
            Circle(SKETCH23_R_2, mode=Mode.SUBTRACT)
    extrude(amount=BOSS_EXTRUDE12_DEPTH + BOSS_EXTRUDE12_DEPTH_BACK)

    # Chamfer4
    chamfer4_edges = [part.edges().sort_by_distance(p)[0] for p in [
        (35.58, 20.55625, -28.375),
        (20.79, 18.175, -28.375),
        (6, 20.55625, -28.375),
    ]]
    chamfer(chamfer4_edges, length=CHAMFER4_SIZE)


with BuildPart() as body_2:
    # Mirror1: mirrored copy
    add(part.part.mirror(Plane(origin=(51.58, 0, 0), x_dir=(0, 0, 1), z_dir=(1, 0, 0))))


solid = body_2.part
